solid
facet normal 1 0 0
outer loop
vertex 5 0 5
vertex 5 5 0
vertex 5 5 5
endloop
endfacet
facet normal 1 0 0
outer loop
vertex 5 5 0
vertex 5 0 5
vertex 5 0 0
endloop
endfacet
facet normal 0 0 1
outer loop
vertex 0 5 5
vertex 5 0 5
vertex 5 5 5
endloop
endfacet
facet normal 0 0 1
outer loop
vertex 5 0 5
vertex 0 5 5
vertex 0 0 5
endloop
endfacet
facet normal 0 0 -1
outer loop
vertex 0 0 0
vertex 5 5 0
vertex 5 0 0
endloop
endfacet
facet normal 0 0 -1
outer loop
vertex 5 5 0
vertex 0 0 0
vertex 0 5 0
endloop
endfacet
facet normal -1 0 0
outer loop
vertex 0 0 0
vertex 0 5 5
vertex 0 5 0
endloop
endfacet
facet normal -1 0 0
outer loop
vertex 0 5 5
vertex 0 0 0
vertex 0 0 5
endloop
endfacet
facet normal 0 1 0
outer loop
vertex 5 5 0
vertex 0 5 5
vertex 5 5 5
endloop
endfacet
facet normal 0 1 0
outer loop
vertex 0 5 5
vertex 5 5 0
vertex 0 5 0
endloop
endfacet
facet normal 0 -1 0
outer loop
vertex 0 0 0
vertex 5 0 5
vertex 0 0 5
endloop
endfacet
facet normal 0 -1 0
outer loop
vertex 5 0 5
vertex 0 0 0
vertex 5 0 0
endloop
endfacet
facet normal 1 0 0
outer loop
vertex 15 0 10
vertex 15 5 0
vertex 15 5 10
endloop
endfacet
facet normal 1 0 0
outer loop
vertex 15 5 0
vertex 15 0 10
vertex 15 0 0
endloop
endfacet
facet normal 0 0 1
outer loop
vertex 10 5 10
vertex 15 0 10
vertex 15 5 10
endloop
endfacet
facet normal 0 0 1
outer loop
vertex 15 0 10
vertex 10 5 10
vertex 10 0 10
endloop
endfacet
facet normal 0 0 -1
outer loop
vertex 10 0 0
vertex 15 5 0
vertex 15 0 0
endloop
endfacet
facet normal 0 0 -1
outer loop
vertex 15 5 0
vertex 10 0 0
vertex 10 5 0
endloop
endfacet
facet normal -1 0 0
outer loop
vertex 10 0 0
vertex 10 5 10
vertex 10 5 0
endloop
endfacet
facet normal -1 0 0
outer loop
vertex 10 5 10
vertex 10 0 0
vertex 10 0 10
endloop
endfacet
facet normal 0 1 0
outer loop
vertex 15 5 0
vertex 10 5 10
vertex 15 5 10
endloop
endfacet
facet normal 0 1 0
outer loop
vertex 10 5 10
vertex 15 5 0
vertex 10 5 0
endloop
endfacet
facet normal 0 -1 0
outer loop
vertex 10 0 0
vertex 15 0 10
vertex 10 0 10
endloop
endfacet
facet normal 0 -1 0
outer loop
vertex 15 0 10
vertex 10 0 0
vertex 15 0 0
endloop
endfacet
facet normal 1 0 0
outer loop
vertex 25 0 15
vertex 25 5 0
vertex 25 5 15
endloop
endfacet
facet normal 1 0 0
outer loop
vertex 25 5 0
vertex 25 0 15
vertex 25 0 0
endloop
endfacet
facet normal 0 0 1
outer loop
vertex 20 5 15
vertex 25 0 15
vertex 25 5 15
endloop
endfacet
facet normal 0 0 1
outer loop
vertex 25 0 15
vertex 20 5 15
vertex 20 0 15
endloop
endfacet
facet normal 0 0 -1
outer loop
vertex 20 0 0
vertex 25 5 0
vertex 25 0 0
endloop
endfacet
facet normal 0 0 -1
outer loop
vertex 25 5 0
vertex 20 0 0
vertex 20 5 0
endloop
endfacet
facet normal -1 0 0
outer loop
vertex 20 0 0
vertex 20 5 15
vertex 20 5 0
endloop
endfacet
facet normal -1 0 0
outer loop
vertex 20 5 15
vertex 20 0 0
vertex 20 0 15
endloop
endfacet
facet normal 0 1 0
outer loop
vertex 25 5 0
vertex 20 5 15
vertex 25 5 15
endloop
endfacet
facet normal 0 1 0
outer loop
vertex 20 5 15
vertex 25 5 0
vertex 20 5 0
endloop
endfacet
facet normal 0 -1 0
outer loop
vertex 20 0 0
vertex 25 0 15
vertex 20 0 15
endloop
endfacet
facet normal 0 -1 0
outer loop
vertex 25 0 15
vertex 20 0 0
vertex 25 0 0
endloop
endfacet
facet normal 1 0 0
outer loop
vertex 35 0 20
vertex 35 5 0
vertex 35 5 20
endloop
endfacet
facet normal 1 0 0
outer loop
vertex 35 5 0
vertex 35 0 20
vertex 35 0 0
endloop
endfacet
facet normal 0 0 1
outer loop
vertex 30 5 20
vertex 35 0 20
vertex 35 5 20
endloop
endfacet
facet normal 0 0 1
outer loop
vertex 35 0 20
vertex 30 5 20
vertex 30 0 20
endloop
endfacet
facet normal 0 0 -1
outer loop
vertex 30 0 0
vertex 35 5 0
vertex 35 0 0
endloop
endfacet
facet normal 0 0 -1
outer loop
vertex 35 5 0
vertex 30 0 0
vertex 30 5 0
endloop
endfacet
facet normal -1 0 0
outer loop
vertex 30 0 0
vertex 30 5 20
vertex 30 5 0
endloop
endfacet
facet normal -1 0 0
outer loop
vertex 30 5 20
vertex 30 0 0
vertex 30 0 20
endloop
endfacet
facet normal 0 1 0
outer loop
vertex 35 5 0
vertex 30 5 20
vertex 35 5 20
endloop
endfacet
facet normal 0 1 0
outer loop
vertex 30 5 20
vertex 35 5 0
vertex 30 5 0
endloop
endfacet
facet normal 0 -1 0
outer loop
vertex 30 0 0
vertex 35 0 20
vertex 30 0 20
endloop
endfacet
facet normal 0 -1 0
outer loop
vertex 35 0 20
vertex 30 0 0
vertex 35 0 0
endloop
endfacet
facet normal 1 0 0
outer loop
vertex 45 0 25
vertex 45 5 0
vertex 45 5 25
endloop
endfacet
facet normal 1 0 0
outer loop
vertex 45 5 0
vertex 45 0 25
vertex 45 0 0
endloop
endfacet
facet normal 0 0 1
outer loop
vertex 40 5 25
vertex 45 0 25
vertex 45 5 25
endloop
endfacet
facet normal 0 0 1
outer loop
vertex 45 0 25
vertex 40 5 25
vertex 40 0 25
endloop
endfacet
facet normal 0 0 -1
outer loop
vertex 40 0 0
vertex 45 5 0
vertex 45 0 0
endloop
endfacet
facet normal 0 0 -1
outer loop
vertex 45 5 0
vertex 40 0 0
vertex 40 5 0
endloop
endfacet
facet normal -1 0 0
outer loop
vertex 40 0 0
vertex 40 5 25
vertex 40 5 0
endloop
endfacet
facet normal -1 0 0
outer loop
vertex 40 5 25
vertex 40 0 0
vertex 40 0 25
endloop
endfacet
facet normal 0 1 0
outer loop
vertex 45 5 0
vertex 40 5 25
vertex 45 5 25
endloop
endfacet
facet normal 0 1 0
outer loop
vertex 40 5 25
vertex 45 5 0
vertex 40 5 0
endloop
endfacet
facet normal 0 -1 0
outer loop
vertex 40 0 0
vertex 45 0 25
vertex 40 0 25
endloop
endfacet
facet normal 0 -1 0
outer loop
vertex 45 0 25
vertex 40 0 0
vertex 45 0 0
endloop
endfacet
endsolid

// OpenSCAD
for(x=[0:1:4]){
    translate([x*10,0,0])cube([5,5,x*5+5]);
}
